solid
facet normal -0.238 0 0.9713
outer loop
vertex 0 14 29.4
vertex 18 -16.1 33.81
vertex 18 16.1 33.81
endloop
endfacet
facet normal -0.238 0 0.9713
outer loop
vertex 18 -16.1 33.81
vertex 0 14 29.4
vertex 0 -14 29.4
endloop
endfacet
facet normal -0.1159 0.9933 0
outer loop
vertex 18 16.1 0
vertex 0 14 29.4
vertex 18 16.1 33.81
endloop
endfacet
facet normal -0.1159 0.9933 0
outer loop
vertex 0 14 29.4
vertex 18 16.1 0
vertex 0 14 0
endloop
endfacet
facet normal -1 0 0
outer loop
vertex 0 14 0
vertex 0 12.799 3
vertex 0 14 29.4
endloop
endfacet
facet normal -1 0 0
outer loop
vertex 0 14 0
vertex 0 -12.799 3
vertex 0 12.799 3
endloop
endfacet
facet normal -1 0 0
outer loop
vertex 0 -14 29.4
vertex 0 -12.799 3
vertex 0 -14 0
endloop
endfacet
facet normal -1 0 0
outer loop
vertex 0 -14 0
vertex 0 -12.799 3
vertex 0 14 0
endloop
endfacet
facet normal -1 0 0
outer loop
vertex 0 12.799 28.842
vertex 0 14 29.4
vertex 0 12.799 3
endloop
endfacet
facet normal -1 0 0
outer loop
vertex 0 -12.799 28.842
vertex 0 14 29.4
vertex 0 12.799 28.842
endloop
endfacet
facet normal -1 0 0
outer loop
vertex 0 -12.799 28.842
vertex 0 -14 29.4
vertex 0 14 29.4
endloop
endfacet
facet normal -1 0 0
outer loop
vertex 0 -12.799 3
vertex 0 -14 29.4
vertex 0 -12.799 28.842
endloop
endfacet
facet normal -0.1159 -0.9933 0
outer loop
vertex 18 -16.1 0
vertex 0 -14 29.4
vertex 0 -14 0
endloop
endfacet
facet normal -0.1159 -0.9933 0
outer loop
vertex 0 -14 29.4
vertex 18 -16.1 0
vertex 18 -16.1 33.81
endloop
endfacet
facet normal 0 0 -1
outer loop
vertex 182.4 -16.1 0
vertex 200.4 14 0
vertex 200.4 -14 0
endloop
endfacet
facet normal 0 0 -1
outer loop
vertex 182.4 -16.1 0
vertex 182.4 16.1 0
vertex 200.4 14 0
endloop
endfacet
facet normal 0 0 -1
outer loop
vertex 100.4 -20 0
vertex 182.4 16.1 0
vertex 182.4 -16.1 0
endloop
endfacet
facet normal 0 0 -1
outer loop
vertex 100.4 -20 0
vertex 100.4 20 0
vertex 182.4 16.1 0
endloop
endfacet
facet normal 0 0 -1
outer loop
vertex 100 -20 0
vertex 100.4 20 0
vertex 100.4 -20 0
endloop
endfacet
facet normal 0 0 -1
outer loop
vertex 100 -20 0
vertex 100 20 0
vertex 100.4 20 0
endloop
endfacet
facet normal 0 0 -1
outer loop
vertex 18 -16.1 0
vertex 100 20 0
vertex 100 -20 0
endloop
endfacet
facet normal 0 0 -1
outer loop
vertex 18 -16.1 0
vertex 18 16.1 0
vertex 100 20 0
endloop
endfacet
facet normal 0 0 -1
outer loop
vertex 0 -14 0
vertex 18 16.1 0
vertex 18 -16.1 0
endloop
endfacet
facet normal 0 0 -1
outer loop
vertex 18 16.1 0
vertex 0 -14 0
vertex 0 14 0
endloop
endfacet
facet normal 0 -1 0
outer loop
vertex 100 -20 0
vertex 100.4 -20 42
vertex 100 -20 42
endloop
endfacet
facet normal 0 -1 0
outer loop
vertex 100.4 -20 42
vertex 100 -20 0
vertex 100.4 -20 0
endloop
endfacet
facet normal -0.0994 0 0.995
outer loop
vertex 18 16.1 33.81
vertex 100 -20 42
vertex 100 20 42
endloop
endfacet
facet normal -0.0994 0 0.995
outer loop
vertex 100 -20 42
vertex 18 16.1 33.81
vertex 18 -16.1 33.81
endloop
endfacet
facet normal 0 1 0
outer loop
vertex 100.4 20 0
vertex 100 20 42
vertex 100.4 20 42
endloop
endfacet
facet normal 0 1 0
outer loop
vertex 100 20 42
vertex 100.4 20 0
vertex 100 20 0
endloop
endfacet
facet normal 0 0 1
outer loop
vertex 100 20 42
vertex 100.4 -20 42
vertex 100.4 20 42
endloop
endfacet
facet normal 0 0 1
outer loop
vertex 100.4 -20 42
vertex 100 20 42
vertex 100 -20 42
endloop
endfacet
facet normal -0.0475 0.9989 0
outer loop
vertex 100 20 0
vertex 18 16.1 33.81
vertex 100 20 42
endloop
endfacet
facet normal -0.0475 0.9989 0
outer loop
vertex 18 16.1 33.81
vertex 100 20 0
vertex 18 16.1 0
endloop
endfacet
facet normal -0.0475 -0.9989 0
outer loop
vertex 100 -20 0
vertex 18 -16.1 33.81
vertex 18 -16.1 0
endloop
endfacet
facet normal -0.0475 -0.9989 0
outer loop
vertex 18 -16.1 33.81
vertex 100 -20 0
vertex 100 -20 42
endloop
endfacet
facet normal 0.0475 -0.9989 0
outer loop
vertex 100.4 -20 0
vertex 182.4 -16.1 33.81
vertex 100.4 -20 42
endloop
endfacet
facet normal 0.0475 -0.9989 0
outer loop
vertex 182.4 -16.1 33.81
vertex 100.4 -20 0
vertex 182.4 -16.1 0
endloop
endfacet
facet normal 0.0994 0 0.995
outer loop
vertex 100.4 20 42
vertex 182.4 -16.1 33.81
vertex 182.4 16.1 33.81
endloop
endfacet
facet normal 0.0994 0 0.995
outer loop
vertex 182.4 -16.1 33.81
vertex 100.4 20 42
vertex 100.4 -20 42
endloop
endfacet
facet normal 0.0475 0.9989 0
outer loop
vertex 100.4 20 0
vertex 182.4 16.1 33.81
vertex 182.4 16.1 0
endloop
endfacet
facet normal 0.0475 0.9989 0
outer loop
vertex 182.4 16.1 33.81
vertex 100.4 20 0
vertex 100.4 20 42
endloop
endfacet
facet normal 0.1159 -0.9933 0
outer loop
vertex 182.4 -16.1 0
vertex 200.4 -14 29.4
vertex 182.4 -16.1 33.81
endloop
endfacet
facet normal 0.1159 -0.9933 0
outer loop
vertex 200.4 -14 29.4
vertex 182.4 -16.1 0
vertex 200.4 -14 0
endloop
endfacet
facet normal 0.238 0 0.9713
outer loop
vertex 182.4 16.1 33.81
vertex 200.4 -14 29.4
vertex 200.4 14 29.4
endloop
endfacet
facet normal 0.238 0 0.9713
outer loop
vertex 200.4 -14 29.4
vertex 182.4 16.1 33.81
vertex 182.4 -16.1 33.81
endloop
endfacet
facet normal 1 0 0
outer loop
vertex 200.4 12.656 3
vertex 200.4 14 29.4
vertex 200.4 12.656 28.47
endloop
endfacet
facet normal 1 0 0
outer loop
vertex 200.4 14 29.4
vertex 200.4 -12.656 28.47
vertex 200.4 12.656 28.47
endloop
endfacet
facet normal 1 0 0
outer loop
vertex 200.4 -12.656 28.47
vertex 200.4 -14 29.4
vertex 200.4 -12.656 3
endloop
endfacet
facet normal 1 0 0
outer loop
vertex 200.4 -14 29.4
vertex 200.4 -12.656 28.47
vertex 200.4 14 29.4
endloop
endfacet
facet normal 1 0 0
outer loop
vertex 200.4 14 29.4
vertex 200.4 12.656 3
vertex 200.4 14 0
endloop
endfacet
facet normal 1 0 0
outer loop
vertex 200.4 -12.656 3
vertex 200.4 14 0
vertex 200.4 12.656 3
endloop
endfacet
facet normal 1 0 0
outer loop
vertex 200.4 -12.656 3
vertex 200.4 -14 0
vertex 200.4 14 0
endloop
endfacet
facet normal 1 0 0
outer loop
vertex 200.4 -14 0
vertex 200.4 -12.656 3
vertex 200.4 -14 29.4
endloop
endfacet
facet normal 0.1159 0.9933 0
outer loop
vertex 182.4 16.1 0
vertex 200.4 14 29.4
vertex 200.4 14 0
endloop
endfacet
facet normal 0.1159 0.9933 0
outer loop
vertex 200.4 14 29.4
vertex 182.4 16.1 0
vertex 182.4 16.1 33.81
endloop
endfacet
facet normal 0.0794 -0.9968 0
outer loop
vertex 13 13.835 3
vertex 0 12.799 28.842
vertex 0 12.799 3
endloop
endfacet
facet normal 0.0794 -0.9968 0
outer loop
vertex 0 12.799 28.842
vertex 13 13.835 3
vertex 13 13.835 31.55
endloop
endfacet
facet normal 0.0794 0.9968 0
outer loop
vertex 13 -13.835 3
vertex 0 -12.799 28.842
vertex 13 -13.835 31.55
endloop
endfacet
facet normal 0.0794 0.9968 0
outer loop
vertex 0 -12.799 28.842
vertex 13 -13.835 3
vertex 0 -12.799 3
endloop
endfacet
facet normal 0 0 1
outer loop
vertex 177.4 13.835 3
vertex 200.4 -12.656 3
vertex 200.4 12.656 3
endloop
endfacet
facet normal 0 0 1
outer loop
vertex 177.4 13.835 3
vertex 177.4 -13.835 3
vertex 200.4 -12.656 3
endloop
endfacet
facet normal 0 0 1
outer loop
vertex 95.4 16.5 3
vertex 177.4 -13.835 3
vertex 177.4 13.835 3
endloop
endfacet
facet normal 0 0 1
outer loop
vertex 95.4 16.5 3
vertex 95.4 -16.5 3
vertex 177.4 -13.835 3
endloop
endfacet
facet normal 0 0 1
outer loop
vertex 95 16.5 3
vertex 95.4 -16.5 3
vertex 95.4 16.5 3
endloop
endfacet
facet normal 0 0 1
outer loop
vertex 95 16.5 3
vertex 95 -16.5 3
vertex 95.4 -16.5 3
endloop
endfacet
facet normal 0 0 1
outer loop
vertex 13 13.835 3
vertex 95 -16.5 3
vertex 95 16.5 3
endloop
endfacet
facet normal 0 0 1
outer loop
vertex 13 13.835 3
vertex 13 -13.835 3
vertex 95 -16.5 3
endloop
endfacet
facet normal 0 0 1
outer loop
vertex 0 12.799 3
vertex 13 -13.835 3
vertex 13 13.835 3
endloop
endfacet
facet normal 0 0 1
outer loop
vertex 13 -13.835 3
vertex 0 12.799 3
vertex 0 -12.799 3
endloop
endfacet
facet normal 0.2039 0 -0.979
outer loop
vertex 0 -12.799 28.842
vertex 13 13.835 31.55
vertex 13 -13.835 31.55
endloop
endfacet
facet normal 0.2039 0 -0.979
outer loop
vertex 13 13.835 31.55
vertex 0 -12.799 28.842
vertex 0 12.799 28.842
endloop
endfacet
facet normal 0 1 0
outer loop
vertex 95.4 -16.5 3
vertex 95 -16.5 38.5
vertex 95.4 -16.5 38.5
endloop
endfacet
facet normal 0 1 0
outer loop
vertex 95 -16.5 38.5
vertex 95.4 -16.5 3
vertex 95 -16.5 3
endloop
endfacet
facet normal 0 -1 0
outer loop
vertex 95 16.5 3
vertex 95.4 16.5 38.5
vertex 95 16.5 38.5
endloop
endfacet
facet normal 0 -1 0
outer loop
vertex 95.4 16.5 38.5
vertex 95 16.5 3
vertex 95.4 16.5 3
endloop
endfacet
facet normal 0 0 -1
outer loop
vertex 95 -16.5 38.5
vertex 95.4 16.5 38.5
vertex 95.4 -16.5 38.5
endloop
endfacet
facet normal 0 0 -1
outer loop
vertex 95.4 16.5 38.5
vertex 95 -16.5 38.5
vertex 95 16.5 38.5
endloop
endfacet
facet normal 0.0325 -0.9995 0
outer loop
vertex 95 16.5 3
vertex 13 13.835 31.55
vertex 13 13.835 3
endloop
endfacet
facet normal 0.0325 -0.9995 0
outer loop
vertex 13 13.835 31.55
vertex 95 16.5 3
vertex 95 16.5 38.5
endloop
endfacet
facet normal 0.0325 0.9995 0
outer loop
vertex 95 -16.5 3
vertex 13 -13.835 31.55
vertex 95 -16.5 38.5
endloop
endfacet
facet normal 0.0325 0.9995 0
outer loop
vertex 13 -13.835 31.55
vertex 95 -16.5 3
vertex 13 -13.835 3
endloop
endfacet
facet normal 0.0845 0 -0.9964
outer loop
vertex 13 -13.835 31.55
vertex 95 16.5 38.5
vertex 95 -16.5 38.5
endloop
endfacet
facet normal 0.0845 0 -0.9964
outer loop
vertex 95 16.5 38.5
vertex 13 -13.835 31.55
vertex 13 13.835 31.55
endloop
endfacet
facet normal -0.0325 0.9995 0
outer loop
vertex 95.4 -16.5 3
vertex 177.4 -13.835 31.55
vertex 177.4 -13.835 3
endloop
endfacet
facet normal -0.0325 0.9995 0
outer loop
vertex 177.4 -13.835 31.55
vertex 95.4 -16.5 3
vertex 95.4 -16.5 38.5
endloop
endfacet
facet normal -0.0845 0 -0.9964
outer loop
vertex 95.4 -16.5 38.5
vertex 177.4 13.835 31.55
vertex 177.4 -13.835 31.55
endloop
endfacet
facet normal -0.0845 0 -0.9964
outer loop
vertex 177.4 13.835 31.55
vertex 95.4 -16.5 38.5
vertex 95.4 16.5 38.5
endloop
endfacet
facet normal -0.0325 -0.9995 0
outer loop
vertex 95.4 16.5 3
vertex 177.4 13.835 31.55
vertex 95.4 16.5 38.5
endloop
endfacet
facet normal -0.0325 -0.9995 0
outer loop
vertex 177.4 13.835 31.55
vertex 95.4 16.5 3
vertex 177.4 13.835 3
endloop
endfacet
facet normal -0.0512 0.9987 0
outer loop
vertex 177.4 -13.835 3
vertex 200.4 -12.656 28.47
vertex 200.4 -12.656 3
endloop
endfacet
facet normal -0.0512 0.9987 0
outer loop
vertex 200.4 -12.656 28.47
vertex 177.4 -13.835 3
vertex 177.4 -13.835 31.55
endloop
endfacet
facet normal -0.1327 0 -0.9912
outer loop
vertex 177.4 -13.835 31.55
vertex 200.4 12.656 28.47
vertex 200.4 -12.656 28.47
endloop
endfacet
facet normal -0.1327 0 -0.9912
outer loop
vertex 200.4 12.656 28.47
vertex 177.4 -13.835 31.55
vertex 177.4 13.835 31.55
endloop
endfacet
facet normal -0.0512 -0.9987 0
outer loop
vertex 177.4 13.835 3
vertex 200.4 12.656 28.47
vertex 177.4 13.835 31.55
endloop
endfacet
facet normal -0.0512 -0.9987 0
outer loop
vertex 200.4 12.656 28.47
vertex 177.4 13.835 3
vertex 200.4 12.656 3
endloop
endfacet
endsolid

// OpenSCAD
$fn = 32;

// ----------------------------------------------------------------------
// Faired channel: 200 x 40 x 42 mm, 3.5 mm walls, faired ends
// ----------------------------------------------------------------------

// --- parameters (mm) ---
length = 200;             // channel length
width = 40;               // channel width at mid length
height = 42;              // channel height at mid length
wall = 3.5;               // side wall thickness
floor_t = 3;              // floor thickness
end_w = 28;               // faired end width
end_h = 29.4;             // faired end height

difference() {
  union() {
    hull() {
      translate([0, -14, 0]) cube([0.4, 28, 29.4]);
      translate([18, -16.1, 0]) cube([0.4, 32.2, 33.81]);
    }
    hull() {
      translate([18, -16.1, 0]) cube([0.4, 32.2, 33.81]);
      translate([100, -20, 0]) cube([0.4, 40, 42]);
    }
    hull() {
      translate([100, -20, 0]) cube([0.4, 40, 42]);
      translate([182, -16.1, 0]) cube([0.4, 32.2, 33.81]);
    }
    hull() {
      translate([182, -16.1, 0]) cube([0.4, 32.2, 33.81]);
      translate([200, -14, 0]) cube([0.4, 28, 29.4]);
    }
  }
  /* cavity, 5 mm proud of both ends so the ports are cut clean */
  hull() {
    translate([-5, -12.4, 3]) cube([0.4, 24.8, 24.8]);
    translate([13, -13.835, 3]) cube([0.4, 27.67, 28.55]);
  }
  hull() {
    translate([13, -13.835, 3]) cube([0.4, 27.67, 28.55]);
    translate([95, -16.5, 3]) cube([0.4, 33, 35.5]);
  }
  hull() {
    translate([95, -16.5, 3]) cube([0.4, 33, 35.5]);
    translate([177, -13.835, 3]) cube([0.4, 27.67, 28.55]);
  }
  hull() {
    translate([177, -13.835, 3]) cube([0.4, 27.67, 28.55]);
    translate([205, -12.4, 3]) cube([0.4, 24.8, 24.8]);
  }
}
